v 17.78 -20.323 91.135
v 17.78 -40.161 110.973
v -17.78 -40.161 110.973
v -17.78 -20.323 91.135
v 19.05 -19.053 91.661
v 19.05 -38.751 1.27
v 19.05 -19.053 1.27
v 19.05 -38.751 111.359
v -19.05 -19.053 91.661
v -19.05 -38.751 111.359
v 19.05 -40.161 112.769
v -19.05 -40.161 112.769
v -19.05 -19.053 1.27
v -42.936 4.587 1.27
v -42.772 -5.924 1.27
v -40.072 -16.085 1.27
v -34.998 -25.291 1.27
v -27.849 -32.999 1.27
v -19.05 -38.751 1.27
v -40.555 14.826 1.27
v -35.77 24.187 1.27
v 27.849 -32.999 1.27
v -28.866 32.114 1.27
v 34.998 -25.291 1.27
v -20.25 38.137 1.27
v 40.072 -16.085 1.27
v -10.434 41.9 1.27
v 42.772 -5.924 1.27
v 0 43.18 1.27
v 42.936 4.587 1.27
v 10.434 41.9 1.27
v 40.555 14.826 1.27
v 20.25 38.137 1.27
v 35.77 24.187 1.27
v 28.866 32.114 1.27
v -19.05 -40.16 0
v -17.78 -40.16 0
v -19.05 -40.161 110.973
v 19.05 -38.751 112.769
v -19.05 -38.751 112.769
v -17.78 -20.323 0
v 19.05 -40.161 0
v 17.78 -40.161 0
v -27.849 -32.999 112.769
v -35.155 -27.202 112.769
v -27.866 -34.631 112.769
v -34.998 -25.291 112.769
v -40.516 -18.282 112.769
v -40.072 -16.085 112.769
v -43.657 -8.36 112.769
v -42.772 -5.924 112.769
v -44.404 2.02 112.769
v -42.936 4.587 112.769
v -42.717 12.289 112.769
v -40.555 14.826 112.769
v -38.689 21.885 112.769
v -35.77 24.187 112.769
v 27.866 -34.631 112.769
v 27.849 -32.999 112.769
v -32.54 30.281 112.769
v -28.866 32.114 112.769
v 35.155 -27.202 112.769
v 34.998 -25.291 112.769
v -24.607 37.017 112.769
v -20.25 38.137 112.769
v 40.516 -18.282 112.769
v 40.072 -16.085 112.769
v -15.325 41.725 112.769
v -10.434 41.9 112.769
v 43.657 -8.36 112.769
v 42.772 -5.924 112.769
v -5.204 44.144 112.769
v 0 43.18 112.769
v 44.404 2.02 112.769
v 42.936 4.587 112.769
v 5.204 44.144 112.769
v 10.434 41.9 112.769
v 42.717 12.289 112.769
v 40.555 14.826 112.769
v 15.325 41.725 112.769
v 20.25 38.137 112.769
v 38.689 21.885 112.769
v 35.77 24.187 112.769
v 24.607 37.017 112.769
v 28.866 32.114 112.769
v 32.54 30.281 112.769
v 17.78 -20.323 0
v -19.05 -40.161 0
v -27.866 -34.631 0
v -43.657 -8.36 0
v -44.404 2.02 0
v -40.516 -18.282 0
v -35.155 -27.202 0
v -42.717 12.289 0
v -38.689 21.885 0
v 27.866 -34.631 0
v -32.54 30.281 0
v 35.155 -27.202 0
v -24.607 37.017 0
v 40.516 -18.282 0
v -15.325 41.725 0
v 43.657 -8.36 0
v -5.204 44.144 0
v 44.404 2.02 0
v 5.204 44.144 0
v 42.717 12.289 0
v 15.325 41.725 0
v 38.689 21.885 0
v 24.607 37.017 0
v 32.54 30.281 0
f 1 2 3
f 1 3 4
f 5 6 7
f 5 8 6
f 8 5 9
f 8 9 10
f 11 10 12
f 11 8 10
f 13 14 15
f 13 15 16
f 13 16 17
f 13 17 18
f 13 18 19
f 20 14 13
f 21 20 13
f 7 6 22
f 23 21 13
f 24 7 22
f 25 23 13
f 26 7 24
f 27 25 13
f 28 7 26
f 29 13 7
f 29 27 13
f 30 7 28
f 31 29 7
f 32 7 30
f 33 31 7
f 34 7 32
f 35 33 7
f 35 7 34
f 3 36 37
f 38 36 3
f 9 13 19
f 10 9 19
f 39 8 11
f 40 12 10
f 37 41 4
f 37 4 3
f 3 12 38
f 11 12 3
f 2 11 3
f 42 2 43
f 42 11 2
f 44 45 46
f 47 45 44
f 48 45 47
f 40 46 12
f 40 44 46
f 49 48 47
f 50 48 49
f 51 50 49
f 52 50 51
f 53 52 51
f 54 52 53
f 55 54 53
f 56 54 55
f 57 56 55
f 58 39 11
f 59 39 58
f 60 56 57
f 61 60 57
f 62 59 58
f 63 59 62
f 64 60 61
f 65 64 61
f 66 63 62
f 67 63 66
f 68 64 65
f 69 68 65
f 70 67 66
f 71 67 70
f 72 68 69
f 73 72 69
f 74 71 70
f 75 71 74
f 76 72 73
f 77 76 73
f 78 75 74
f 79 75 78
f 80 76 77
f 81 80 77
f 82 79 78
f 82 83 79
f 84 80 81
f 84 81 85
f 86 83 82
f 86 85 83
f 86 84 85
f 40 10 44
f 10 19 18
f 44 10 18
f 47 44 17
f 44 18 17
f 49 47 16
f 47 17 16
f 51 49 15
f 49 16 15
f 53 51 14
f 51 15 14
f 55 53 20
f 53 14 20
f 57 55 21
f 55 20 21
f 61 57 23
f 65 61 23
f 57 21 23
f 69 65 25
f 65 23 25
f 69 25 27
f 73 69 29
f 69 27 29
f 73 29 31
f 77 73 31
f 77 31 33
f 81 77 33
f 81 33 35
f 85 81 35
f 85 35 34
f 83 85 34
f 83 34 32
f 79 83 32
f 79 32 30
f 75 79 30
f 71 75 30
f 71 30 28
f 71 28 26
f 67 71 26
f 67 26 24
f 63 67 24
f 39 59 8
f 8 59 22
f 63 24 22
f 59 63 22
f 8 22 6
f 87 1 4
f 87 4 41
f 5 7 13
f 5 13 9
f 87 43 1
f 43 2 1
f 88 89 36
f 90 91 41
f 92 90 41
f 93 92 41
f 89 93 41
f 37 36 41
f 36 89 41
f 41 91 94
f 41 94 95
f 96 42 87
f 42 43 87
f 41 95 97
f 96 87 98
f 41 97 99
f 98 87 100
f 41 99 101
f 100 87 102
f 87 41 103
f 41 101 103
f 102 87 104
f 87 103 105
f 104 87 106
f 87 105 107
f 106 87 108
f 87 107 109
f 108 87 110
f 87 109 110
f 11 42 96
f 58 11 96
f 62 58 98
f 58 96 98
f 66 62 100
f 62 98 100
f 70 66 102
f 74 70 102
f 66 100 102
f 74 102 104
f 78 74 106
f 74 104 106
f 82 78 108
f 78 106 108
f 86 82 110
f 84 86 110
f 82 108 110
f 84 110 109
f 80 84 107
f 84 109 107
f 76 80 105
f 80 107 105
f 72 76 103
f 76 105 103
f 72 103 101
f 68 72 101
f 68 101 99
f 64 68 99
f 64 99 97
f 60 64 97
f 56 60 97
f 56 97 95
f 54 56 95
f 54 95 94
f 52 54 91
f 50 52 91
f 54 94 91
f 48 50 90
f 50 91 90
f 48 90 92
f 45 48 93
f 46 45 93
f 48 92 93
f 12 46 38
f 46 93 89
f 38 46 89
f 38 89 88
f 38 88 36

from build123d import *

# Parameters (mm, degrees)
F3_DEPTH = 1.27
F4_DEPTH = 38.1
F7_DEPTH = 1.27
F8_DEPTH = 112.7691580497
F9_DEPTH = 1.27


with BuildPart() as f3:
    # F2 (on plane+point) → F3 (new body)
    with BuildSketch(Plane.YZ.offset(19.05)):
        Polygon((-40.1609262841, 0), (-20.3232679032, 0), (-20.3232679032, 1.27), (-20.3232679032, 91.1354484446), (-38.8909262841, 109.7031068255), (-40.1609262841, 110.9731068255), align=None)
    extrude(amount=-F3_DEPTH)

    # F2 (on plane+point) → F4 (join)
    with BuildSketch(Plane.YZ.offset(19.05)):
        Polygon((-20.3232679032, 0), (-19.0532679032, 0), (-19.0532679032, 91.6614996688), (-40.1609262841, 112.7691580497), (-40.1609262841, 110.9731068255), (-38.8909262841, 109.7031068255), (-20.3232679032, 91.1354484446), (-20.3232679032, 1.27), align=None)
    extrude(amount=-F4_DEPTH)

    # F6 (on offset) → F7 (join)
    with BuildSketch(Plane(origin=(-19.05, 0, 0), x_dir=(0, -1, 0), z_dir=(-1, 0, 0))):
        Polygon((20.3232679032, 0), (40.1597768068, 0), (40.1609262841, 110.9731068255), (20.3232679032, 91.1354484446), align=None)
    extrude(amount=-F7_DEPTH)

    # F0 (on Top) → F8 (join, through all)
    with BuildSketch(Plane.XY):
        with BuildLine():
            Line((19.05, -38.7506116081), (19.05, -40.1609262841))
            ThreePointArc((19.05, -40.1609262841), (0, 44.45), (-19.05, -40.1609262841))
            Line((-19.05, -40.1609262841), (-19.05, -38.7506116081))
            ThreePointArc((-19.05, -38.7506116081), (0, 43.18), (19.05, -38.7506116081))
        make_face()
    extrude(amount=F8_DEPTH)

    # F0 (on Top) → F9 (join)
    with BuildSketch(Plane.XY):
        with BuildLine():
            Line((19.05, -19.0532679032), (19.05, -38.7506116081))
            ThreePointArc((19.05, -38.7506116081), (0, 43.18), (-19.05, -38.7506116081))
            Line((-19.05, -38.7506116081), (-19.05, -19.0532679032))
            Line((-19.05, -19.0532679032), (0, -19.0532679032))
            Line((0, -19.0532679032), (19.05, -19.0532679032))
        make_face()
    extrude(amount=F9_DEPTH)


solid = f3.part
